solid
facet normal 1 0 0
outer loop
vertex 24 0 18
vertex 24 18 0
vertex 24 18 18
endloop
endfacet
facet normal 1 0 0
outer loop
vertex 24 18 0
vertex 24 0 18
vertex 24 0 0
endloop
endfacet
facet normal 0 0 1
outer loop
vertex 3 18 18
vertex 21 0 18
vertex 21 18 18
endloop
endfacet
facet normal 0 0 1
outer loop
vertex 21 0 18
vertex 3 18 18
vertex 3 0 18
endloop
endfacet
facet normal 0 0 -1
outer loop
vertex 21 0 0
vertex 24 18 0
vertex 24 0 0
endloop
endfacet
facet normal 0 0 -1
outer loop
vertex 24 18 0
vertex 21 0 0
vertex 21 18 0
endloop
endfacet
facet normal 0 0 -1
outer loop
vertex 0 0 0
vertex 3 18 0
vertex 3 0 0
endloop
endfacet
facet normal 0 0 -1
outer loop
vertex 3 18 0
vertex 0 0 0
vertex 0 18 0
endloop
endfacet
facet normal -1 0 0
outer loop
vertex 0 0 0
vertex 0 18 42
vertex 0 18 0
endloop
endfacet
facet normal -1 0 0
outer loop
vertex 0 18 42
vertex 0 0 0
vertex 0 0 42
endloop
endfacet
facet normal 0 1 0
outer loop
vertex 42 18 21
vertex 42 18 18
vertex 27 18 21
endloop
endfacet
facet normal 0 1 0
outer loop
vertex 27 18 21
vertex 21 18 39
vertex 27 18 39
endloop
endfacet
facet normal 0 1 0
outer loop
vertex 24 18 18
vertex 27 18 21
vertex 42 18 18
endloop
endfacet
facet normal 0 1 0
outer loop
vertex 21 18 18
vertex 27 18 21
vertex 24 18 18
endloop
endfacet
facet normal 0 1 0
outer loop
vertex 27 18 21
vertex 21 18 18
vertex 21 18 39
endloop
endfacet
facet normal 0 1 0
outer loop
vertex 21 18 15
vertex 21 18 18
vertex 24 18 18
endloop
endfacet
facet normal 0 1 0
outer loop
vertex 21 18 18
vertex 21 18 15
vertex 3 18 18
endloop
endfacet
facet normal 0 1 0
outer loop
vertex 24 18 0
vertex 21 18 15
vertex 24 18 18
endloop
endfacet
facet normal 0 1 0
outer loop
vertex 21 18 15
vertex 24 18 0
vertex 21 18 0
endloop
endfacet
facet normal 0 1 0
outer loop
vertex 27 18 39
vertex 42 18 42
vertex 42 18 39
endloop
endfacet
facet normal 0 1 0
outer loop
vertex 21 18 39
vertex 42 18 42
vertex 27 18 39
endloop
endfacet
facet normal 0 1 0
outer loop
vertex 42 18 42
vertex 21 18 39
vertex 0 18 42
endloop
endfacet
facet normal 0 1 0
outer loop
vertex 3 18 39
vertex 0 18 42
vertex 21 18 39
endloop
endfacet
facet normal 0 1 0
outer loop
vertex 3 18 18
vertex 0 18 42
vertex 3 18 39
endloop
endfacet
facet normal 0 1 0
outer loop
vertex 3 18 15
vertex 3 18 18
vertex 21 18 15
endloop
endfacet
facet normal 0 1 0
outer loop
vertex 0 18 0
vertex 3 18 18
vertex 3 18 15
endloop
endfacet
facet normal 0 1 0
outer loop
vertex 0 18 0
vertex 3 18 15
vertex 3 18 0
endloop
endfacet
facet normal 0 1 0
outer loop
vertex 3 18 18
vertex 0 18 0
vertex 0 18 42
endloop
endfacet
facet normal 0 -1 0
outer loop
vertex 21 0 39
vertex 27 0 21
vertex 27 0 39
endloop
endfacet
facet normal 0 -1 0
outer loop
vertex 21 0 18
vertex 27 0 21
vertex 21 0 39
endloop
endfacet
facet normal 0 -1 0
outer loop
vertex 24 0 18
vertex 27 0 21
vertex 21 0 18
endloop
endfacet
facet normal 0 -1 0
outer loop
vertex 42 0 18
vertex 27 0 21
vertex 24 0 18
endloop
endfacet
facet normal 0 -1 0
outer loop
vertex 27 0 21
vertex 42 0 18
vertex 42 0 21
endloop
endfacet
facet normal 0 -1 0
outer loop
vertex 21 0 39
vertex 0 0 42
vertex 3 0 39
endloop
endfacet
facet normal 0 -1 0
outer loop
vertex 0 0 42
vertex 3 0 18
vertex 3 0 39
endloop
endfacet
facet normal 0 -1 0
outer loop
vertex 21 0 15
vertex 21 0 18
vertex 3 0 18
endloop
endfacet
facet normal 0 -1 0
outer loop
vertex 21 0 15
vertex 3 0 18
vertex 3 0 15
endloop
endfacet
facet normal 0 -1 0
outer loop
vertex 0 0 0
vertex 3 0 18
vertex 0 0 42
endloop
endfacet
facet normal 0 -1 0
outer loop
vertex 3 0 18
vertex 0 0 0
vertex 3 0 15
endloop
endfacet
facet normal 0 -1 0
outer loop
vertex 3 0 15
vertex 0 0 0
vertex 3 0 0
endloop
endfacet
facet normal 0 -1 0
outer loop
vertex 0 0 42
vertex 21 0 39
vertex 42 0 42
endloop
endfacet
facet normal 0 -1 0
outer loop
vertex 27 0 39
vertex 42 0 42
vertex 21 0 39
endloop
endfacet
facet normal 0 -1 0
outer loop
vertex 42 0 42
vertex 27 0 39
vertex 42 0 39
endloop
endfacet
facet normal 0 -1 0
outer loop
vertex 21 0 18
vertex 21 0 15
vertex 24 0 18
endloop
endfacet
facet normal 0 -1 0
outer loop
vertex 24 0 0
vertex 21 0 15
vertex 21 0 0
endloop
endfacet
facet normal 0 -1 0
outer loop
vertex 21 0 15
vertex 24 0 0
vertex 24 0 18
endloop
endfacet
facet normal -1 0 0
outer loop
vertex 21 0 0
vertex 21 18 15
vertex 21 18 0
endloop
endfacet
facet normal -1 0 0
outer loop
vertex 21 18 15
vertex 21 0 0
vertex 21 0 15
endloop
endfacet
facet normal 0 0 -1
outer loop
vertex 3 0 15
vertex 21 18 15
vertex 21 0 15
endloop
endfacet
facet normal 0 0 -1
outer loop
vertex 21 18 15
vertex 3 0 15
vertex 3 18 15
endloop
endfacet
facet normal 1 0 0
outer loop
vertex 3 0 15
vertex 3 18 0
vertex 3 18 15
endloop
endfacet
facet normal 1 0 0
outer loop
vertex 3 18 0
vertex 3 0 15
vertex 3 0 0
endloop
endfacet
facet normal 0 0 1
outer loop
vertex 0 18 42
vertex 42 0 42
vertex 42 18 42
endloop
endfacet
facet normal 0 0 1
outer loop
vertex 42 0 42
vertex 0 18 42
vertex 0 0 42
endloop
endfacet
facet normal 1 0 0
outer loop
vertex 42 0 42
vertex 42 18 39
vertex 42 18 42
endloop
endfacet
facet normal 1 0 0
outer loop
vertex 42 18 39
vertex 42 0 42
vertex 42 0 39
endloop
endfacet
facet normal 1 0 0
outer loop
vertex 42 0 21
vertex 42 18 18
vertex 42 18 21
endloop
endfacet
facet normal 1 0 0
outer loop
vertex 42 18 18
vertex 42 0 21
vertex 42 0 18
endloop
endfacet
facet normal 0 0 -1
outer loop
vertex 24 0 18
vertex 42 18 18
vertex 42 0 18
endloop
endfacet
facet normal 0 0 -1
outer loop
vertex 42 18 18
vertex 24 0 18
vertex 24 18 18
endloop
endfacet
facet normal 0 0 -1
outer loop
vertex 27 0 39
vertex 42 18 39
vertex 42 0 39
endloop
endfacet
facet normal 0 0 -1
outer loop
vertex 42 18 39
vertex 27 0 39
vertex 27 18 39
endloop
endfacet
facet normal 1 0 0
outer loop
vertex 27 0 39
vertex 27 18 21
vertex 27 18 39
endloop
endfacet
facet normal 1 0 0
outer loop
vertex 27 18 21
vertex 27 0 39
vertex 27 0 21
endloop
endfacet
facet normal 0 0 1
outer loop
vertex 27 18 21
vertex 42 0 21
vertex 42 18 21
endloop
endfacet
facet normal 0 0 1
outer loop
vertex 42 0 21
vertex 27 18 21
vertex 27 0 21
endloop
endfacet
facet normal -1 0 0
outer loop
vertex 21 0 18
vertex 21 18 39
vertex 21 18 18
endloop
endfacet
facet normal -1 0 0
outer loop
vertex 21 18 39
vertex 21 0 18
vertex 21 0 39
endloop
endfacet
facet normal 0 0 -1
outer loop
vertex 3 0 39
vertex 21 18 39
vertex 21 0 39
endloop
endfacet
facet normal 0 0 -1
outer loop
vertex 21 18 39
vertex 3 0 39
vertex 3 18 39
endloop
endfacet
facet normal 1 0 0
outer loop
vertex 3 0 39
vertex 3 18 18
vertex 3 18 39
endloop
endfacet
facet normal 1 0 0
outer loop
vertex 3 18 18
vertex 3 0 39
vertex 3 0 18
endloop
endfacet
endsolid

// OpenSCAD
union () {
  difference () {
    cube ([24, 18, 18]);
    translate ([3, -0.5, -1]) {
      cube ([18, 19, 16]);
    }
  }
  translate ([42, 0, 18]) {
    rotate (a=-90.0, v=[0, 1, 0]) {
      difference () {
        cube ([24, 18, 18]);
        translate ([3, -0.5, -1]) {
          cube ([18, 19, 16]);
        }
      }
    }
  }
  translate ([0, 0, 18]) {
    difference () {
      cube ([24, 18, 24]);
      translate ([3, -0.5, -1]) {
        cube ([18, 19, 22]);
      }
    }
  }
}
